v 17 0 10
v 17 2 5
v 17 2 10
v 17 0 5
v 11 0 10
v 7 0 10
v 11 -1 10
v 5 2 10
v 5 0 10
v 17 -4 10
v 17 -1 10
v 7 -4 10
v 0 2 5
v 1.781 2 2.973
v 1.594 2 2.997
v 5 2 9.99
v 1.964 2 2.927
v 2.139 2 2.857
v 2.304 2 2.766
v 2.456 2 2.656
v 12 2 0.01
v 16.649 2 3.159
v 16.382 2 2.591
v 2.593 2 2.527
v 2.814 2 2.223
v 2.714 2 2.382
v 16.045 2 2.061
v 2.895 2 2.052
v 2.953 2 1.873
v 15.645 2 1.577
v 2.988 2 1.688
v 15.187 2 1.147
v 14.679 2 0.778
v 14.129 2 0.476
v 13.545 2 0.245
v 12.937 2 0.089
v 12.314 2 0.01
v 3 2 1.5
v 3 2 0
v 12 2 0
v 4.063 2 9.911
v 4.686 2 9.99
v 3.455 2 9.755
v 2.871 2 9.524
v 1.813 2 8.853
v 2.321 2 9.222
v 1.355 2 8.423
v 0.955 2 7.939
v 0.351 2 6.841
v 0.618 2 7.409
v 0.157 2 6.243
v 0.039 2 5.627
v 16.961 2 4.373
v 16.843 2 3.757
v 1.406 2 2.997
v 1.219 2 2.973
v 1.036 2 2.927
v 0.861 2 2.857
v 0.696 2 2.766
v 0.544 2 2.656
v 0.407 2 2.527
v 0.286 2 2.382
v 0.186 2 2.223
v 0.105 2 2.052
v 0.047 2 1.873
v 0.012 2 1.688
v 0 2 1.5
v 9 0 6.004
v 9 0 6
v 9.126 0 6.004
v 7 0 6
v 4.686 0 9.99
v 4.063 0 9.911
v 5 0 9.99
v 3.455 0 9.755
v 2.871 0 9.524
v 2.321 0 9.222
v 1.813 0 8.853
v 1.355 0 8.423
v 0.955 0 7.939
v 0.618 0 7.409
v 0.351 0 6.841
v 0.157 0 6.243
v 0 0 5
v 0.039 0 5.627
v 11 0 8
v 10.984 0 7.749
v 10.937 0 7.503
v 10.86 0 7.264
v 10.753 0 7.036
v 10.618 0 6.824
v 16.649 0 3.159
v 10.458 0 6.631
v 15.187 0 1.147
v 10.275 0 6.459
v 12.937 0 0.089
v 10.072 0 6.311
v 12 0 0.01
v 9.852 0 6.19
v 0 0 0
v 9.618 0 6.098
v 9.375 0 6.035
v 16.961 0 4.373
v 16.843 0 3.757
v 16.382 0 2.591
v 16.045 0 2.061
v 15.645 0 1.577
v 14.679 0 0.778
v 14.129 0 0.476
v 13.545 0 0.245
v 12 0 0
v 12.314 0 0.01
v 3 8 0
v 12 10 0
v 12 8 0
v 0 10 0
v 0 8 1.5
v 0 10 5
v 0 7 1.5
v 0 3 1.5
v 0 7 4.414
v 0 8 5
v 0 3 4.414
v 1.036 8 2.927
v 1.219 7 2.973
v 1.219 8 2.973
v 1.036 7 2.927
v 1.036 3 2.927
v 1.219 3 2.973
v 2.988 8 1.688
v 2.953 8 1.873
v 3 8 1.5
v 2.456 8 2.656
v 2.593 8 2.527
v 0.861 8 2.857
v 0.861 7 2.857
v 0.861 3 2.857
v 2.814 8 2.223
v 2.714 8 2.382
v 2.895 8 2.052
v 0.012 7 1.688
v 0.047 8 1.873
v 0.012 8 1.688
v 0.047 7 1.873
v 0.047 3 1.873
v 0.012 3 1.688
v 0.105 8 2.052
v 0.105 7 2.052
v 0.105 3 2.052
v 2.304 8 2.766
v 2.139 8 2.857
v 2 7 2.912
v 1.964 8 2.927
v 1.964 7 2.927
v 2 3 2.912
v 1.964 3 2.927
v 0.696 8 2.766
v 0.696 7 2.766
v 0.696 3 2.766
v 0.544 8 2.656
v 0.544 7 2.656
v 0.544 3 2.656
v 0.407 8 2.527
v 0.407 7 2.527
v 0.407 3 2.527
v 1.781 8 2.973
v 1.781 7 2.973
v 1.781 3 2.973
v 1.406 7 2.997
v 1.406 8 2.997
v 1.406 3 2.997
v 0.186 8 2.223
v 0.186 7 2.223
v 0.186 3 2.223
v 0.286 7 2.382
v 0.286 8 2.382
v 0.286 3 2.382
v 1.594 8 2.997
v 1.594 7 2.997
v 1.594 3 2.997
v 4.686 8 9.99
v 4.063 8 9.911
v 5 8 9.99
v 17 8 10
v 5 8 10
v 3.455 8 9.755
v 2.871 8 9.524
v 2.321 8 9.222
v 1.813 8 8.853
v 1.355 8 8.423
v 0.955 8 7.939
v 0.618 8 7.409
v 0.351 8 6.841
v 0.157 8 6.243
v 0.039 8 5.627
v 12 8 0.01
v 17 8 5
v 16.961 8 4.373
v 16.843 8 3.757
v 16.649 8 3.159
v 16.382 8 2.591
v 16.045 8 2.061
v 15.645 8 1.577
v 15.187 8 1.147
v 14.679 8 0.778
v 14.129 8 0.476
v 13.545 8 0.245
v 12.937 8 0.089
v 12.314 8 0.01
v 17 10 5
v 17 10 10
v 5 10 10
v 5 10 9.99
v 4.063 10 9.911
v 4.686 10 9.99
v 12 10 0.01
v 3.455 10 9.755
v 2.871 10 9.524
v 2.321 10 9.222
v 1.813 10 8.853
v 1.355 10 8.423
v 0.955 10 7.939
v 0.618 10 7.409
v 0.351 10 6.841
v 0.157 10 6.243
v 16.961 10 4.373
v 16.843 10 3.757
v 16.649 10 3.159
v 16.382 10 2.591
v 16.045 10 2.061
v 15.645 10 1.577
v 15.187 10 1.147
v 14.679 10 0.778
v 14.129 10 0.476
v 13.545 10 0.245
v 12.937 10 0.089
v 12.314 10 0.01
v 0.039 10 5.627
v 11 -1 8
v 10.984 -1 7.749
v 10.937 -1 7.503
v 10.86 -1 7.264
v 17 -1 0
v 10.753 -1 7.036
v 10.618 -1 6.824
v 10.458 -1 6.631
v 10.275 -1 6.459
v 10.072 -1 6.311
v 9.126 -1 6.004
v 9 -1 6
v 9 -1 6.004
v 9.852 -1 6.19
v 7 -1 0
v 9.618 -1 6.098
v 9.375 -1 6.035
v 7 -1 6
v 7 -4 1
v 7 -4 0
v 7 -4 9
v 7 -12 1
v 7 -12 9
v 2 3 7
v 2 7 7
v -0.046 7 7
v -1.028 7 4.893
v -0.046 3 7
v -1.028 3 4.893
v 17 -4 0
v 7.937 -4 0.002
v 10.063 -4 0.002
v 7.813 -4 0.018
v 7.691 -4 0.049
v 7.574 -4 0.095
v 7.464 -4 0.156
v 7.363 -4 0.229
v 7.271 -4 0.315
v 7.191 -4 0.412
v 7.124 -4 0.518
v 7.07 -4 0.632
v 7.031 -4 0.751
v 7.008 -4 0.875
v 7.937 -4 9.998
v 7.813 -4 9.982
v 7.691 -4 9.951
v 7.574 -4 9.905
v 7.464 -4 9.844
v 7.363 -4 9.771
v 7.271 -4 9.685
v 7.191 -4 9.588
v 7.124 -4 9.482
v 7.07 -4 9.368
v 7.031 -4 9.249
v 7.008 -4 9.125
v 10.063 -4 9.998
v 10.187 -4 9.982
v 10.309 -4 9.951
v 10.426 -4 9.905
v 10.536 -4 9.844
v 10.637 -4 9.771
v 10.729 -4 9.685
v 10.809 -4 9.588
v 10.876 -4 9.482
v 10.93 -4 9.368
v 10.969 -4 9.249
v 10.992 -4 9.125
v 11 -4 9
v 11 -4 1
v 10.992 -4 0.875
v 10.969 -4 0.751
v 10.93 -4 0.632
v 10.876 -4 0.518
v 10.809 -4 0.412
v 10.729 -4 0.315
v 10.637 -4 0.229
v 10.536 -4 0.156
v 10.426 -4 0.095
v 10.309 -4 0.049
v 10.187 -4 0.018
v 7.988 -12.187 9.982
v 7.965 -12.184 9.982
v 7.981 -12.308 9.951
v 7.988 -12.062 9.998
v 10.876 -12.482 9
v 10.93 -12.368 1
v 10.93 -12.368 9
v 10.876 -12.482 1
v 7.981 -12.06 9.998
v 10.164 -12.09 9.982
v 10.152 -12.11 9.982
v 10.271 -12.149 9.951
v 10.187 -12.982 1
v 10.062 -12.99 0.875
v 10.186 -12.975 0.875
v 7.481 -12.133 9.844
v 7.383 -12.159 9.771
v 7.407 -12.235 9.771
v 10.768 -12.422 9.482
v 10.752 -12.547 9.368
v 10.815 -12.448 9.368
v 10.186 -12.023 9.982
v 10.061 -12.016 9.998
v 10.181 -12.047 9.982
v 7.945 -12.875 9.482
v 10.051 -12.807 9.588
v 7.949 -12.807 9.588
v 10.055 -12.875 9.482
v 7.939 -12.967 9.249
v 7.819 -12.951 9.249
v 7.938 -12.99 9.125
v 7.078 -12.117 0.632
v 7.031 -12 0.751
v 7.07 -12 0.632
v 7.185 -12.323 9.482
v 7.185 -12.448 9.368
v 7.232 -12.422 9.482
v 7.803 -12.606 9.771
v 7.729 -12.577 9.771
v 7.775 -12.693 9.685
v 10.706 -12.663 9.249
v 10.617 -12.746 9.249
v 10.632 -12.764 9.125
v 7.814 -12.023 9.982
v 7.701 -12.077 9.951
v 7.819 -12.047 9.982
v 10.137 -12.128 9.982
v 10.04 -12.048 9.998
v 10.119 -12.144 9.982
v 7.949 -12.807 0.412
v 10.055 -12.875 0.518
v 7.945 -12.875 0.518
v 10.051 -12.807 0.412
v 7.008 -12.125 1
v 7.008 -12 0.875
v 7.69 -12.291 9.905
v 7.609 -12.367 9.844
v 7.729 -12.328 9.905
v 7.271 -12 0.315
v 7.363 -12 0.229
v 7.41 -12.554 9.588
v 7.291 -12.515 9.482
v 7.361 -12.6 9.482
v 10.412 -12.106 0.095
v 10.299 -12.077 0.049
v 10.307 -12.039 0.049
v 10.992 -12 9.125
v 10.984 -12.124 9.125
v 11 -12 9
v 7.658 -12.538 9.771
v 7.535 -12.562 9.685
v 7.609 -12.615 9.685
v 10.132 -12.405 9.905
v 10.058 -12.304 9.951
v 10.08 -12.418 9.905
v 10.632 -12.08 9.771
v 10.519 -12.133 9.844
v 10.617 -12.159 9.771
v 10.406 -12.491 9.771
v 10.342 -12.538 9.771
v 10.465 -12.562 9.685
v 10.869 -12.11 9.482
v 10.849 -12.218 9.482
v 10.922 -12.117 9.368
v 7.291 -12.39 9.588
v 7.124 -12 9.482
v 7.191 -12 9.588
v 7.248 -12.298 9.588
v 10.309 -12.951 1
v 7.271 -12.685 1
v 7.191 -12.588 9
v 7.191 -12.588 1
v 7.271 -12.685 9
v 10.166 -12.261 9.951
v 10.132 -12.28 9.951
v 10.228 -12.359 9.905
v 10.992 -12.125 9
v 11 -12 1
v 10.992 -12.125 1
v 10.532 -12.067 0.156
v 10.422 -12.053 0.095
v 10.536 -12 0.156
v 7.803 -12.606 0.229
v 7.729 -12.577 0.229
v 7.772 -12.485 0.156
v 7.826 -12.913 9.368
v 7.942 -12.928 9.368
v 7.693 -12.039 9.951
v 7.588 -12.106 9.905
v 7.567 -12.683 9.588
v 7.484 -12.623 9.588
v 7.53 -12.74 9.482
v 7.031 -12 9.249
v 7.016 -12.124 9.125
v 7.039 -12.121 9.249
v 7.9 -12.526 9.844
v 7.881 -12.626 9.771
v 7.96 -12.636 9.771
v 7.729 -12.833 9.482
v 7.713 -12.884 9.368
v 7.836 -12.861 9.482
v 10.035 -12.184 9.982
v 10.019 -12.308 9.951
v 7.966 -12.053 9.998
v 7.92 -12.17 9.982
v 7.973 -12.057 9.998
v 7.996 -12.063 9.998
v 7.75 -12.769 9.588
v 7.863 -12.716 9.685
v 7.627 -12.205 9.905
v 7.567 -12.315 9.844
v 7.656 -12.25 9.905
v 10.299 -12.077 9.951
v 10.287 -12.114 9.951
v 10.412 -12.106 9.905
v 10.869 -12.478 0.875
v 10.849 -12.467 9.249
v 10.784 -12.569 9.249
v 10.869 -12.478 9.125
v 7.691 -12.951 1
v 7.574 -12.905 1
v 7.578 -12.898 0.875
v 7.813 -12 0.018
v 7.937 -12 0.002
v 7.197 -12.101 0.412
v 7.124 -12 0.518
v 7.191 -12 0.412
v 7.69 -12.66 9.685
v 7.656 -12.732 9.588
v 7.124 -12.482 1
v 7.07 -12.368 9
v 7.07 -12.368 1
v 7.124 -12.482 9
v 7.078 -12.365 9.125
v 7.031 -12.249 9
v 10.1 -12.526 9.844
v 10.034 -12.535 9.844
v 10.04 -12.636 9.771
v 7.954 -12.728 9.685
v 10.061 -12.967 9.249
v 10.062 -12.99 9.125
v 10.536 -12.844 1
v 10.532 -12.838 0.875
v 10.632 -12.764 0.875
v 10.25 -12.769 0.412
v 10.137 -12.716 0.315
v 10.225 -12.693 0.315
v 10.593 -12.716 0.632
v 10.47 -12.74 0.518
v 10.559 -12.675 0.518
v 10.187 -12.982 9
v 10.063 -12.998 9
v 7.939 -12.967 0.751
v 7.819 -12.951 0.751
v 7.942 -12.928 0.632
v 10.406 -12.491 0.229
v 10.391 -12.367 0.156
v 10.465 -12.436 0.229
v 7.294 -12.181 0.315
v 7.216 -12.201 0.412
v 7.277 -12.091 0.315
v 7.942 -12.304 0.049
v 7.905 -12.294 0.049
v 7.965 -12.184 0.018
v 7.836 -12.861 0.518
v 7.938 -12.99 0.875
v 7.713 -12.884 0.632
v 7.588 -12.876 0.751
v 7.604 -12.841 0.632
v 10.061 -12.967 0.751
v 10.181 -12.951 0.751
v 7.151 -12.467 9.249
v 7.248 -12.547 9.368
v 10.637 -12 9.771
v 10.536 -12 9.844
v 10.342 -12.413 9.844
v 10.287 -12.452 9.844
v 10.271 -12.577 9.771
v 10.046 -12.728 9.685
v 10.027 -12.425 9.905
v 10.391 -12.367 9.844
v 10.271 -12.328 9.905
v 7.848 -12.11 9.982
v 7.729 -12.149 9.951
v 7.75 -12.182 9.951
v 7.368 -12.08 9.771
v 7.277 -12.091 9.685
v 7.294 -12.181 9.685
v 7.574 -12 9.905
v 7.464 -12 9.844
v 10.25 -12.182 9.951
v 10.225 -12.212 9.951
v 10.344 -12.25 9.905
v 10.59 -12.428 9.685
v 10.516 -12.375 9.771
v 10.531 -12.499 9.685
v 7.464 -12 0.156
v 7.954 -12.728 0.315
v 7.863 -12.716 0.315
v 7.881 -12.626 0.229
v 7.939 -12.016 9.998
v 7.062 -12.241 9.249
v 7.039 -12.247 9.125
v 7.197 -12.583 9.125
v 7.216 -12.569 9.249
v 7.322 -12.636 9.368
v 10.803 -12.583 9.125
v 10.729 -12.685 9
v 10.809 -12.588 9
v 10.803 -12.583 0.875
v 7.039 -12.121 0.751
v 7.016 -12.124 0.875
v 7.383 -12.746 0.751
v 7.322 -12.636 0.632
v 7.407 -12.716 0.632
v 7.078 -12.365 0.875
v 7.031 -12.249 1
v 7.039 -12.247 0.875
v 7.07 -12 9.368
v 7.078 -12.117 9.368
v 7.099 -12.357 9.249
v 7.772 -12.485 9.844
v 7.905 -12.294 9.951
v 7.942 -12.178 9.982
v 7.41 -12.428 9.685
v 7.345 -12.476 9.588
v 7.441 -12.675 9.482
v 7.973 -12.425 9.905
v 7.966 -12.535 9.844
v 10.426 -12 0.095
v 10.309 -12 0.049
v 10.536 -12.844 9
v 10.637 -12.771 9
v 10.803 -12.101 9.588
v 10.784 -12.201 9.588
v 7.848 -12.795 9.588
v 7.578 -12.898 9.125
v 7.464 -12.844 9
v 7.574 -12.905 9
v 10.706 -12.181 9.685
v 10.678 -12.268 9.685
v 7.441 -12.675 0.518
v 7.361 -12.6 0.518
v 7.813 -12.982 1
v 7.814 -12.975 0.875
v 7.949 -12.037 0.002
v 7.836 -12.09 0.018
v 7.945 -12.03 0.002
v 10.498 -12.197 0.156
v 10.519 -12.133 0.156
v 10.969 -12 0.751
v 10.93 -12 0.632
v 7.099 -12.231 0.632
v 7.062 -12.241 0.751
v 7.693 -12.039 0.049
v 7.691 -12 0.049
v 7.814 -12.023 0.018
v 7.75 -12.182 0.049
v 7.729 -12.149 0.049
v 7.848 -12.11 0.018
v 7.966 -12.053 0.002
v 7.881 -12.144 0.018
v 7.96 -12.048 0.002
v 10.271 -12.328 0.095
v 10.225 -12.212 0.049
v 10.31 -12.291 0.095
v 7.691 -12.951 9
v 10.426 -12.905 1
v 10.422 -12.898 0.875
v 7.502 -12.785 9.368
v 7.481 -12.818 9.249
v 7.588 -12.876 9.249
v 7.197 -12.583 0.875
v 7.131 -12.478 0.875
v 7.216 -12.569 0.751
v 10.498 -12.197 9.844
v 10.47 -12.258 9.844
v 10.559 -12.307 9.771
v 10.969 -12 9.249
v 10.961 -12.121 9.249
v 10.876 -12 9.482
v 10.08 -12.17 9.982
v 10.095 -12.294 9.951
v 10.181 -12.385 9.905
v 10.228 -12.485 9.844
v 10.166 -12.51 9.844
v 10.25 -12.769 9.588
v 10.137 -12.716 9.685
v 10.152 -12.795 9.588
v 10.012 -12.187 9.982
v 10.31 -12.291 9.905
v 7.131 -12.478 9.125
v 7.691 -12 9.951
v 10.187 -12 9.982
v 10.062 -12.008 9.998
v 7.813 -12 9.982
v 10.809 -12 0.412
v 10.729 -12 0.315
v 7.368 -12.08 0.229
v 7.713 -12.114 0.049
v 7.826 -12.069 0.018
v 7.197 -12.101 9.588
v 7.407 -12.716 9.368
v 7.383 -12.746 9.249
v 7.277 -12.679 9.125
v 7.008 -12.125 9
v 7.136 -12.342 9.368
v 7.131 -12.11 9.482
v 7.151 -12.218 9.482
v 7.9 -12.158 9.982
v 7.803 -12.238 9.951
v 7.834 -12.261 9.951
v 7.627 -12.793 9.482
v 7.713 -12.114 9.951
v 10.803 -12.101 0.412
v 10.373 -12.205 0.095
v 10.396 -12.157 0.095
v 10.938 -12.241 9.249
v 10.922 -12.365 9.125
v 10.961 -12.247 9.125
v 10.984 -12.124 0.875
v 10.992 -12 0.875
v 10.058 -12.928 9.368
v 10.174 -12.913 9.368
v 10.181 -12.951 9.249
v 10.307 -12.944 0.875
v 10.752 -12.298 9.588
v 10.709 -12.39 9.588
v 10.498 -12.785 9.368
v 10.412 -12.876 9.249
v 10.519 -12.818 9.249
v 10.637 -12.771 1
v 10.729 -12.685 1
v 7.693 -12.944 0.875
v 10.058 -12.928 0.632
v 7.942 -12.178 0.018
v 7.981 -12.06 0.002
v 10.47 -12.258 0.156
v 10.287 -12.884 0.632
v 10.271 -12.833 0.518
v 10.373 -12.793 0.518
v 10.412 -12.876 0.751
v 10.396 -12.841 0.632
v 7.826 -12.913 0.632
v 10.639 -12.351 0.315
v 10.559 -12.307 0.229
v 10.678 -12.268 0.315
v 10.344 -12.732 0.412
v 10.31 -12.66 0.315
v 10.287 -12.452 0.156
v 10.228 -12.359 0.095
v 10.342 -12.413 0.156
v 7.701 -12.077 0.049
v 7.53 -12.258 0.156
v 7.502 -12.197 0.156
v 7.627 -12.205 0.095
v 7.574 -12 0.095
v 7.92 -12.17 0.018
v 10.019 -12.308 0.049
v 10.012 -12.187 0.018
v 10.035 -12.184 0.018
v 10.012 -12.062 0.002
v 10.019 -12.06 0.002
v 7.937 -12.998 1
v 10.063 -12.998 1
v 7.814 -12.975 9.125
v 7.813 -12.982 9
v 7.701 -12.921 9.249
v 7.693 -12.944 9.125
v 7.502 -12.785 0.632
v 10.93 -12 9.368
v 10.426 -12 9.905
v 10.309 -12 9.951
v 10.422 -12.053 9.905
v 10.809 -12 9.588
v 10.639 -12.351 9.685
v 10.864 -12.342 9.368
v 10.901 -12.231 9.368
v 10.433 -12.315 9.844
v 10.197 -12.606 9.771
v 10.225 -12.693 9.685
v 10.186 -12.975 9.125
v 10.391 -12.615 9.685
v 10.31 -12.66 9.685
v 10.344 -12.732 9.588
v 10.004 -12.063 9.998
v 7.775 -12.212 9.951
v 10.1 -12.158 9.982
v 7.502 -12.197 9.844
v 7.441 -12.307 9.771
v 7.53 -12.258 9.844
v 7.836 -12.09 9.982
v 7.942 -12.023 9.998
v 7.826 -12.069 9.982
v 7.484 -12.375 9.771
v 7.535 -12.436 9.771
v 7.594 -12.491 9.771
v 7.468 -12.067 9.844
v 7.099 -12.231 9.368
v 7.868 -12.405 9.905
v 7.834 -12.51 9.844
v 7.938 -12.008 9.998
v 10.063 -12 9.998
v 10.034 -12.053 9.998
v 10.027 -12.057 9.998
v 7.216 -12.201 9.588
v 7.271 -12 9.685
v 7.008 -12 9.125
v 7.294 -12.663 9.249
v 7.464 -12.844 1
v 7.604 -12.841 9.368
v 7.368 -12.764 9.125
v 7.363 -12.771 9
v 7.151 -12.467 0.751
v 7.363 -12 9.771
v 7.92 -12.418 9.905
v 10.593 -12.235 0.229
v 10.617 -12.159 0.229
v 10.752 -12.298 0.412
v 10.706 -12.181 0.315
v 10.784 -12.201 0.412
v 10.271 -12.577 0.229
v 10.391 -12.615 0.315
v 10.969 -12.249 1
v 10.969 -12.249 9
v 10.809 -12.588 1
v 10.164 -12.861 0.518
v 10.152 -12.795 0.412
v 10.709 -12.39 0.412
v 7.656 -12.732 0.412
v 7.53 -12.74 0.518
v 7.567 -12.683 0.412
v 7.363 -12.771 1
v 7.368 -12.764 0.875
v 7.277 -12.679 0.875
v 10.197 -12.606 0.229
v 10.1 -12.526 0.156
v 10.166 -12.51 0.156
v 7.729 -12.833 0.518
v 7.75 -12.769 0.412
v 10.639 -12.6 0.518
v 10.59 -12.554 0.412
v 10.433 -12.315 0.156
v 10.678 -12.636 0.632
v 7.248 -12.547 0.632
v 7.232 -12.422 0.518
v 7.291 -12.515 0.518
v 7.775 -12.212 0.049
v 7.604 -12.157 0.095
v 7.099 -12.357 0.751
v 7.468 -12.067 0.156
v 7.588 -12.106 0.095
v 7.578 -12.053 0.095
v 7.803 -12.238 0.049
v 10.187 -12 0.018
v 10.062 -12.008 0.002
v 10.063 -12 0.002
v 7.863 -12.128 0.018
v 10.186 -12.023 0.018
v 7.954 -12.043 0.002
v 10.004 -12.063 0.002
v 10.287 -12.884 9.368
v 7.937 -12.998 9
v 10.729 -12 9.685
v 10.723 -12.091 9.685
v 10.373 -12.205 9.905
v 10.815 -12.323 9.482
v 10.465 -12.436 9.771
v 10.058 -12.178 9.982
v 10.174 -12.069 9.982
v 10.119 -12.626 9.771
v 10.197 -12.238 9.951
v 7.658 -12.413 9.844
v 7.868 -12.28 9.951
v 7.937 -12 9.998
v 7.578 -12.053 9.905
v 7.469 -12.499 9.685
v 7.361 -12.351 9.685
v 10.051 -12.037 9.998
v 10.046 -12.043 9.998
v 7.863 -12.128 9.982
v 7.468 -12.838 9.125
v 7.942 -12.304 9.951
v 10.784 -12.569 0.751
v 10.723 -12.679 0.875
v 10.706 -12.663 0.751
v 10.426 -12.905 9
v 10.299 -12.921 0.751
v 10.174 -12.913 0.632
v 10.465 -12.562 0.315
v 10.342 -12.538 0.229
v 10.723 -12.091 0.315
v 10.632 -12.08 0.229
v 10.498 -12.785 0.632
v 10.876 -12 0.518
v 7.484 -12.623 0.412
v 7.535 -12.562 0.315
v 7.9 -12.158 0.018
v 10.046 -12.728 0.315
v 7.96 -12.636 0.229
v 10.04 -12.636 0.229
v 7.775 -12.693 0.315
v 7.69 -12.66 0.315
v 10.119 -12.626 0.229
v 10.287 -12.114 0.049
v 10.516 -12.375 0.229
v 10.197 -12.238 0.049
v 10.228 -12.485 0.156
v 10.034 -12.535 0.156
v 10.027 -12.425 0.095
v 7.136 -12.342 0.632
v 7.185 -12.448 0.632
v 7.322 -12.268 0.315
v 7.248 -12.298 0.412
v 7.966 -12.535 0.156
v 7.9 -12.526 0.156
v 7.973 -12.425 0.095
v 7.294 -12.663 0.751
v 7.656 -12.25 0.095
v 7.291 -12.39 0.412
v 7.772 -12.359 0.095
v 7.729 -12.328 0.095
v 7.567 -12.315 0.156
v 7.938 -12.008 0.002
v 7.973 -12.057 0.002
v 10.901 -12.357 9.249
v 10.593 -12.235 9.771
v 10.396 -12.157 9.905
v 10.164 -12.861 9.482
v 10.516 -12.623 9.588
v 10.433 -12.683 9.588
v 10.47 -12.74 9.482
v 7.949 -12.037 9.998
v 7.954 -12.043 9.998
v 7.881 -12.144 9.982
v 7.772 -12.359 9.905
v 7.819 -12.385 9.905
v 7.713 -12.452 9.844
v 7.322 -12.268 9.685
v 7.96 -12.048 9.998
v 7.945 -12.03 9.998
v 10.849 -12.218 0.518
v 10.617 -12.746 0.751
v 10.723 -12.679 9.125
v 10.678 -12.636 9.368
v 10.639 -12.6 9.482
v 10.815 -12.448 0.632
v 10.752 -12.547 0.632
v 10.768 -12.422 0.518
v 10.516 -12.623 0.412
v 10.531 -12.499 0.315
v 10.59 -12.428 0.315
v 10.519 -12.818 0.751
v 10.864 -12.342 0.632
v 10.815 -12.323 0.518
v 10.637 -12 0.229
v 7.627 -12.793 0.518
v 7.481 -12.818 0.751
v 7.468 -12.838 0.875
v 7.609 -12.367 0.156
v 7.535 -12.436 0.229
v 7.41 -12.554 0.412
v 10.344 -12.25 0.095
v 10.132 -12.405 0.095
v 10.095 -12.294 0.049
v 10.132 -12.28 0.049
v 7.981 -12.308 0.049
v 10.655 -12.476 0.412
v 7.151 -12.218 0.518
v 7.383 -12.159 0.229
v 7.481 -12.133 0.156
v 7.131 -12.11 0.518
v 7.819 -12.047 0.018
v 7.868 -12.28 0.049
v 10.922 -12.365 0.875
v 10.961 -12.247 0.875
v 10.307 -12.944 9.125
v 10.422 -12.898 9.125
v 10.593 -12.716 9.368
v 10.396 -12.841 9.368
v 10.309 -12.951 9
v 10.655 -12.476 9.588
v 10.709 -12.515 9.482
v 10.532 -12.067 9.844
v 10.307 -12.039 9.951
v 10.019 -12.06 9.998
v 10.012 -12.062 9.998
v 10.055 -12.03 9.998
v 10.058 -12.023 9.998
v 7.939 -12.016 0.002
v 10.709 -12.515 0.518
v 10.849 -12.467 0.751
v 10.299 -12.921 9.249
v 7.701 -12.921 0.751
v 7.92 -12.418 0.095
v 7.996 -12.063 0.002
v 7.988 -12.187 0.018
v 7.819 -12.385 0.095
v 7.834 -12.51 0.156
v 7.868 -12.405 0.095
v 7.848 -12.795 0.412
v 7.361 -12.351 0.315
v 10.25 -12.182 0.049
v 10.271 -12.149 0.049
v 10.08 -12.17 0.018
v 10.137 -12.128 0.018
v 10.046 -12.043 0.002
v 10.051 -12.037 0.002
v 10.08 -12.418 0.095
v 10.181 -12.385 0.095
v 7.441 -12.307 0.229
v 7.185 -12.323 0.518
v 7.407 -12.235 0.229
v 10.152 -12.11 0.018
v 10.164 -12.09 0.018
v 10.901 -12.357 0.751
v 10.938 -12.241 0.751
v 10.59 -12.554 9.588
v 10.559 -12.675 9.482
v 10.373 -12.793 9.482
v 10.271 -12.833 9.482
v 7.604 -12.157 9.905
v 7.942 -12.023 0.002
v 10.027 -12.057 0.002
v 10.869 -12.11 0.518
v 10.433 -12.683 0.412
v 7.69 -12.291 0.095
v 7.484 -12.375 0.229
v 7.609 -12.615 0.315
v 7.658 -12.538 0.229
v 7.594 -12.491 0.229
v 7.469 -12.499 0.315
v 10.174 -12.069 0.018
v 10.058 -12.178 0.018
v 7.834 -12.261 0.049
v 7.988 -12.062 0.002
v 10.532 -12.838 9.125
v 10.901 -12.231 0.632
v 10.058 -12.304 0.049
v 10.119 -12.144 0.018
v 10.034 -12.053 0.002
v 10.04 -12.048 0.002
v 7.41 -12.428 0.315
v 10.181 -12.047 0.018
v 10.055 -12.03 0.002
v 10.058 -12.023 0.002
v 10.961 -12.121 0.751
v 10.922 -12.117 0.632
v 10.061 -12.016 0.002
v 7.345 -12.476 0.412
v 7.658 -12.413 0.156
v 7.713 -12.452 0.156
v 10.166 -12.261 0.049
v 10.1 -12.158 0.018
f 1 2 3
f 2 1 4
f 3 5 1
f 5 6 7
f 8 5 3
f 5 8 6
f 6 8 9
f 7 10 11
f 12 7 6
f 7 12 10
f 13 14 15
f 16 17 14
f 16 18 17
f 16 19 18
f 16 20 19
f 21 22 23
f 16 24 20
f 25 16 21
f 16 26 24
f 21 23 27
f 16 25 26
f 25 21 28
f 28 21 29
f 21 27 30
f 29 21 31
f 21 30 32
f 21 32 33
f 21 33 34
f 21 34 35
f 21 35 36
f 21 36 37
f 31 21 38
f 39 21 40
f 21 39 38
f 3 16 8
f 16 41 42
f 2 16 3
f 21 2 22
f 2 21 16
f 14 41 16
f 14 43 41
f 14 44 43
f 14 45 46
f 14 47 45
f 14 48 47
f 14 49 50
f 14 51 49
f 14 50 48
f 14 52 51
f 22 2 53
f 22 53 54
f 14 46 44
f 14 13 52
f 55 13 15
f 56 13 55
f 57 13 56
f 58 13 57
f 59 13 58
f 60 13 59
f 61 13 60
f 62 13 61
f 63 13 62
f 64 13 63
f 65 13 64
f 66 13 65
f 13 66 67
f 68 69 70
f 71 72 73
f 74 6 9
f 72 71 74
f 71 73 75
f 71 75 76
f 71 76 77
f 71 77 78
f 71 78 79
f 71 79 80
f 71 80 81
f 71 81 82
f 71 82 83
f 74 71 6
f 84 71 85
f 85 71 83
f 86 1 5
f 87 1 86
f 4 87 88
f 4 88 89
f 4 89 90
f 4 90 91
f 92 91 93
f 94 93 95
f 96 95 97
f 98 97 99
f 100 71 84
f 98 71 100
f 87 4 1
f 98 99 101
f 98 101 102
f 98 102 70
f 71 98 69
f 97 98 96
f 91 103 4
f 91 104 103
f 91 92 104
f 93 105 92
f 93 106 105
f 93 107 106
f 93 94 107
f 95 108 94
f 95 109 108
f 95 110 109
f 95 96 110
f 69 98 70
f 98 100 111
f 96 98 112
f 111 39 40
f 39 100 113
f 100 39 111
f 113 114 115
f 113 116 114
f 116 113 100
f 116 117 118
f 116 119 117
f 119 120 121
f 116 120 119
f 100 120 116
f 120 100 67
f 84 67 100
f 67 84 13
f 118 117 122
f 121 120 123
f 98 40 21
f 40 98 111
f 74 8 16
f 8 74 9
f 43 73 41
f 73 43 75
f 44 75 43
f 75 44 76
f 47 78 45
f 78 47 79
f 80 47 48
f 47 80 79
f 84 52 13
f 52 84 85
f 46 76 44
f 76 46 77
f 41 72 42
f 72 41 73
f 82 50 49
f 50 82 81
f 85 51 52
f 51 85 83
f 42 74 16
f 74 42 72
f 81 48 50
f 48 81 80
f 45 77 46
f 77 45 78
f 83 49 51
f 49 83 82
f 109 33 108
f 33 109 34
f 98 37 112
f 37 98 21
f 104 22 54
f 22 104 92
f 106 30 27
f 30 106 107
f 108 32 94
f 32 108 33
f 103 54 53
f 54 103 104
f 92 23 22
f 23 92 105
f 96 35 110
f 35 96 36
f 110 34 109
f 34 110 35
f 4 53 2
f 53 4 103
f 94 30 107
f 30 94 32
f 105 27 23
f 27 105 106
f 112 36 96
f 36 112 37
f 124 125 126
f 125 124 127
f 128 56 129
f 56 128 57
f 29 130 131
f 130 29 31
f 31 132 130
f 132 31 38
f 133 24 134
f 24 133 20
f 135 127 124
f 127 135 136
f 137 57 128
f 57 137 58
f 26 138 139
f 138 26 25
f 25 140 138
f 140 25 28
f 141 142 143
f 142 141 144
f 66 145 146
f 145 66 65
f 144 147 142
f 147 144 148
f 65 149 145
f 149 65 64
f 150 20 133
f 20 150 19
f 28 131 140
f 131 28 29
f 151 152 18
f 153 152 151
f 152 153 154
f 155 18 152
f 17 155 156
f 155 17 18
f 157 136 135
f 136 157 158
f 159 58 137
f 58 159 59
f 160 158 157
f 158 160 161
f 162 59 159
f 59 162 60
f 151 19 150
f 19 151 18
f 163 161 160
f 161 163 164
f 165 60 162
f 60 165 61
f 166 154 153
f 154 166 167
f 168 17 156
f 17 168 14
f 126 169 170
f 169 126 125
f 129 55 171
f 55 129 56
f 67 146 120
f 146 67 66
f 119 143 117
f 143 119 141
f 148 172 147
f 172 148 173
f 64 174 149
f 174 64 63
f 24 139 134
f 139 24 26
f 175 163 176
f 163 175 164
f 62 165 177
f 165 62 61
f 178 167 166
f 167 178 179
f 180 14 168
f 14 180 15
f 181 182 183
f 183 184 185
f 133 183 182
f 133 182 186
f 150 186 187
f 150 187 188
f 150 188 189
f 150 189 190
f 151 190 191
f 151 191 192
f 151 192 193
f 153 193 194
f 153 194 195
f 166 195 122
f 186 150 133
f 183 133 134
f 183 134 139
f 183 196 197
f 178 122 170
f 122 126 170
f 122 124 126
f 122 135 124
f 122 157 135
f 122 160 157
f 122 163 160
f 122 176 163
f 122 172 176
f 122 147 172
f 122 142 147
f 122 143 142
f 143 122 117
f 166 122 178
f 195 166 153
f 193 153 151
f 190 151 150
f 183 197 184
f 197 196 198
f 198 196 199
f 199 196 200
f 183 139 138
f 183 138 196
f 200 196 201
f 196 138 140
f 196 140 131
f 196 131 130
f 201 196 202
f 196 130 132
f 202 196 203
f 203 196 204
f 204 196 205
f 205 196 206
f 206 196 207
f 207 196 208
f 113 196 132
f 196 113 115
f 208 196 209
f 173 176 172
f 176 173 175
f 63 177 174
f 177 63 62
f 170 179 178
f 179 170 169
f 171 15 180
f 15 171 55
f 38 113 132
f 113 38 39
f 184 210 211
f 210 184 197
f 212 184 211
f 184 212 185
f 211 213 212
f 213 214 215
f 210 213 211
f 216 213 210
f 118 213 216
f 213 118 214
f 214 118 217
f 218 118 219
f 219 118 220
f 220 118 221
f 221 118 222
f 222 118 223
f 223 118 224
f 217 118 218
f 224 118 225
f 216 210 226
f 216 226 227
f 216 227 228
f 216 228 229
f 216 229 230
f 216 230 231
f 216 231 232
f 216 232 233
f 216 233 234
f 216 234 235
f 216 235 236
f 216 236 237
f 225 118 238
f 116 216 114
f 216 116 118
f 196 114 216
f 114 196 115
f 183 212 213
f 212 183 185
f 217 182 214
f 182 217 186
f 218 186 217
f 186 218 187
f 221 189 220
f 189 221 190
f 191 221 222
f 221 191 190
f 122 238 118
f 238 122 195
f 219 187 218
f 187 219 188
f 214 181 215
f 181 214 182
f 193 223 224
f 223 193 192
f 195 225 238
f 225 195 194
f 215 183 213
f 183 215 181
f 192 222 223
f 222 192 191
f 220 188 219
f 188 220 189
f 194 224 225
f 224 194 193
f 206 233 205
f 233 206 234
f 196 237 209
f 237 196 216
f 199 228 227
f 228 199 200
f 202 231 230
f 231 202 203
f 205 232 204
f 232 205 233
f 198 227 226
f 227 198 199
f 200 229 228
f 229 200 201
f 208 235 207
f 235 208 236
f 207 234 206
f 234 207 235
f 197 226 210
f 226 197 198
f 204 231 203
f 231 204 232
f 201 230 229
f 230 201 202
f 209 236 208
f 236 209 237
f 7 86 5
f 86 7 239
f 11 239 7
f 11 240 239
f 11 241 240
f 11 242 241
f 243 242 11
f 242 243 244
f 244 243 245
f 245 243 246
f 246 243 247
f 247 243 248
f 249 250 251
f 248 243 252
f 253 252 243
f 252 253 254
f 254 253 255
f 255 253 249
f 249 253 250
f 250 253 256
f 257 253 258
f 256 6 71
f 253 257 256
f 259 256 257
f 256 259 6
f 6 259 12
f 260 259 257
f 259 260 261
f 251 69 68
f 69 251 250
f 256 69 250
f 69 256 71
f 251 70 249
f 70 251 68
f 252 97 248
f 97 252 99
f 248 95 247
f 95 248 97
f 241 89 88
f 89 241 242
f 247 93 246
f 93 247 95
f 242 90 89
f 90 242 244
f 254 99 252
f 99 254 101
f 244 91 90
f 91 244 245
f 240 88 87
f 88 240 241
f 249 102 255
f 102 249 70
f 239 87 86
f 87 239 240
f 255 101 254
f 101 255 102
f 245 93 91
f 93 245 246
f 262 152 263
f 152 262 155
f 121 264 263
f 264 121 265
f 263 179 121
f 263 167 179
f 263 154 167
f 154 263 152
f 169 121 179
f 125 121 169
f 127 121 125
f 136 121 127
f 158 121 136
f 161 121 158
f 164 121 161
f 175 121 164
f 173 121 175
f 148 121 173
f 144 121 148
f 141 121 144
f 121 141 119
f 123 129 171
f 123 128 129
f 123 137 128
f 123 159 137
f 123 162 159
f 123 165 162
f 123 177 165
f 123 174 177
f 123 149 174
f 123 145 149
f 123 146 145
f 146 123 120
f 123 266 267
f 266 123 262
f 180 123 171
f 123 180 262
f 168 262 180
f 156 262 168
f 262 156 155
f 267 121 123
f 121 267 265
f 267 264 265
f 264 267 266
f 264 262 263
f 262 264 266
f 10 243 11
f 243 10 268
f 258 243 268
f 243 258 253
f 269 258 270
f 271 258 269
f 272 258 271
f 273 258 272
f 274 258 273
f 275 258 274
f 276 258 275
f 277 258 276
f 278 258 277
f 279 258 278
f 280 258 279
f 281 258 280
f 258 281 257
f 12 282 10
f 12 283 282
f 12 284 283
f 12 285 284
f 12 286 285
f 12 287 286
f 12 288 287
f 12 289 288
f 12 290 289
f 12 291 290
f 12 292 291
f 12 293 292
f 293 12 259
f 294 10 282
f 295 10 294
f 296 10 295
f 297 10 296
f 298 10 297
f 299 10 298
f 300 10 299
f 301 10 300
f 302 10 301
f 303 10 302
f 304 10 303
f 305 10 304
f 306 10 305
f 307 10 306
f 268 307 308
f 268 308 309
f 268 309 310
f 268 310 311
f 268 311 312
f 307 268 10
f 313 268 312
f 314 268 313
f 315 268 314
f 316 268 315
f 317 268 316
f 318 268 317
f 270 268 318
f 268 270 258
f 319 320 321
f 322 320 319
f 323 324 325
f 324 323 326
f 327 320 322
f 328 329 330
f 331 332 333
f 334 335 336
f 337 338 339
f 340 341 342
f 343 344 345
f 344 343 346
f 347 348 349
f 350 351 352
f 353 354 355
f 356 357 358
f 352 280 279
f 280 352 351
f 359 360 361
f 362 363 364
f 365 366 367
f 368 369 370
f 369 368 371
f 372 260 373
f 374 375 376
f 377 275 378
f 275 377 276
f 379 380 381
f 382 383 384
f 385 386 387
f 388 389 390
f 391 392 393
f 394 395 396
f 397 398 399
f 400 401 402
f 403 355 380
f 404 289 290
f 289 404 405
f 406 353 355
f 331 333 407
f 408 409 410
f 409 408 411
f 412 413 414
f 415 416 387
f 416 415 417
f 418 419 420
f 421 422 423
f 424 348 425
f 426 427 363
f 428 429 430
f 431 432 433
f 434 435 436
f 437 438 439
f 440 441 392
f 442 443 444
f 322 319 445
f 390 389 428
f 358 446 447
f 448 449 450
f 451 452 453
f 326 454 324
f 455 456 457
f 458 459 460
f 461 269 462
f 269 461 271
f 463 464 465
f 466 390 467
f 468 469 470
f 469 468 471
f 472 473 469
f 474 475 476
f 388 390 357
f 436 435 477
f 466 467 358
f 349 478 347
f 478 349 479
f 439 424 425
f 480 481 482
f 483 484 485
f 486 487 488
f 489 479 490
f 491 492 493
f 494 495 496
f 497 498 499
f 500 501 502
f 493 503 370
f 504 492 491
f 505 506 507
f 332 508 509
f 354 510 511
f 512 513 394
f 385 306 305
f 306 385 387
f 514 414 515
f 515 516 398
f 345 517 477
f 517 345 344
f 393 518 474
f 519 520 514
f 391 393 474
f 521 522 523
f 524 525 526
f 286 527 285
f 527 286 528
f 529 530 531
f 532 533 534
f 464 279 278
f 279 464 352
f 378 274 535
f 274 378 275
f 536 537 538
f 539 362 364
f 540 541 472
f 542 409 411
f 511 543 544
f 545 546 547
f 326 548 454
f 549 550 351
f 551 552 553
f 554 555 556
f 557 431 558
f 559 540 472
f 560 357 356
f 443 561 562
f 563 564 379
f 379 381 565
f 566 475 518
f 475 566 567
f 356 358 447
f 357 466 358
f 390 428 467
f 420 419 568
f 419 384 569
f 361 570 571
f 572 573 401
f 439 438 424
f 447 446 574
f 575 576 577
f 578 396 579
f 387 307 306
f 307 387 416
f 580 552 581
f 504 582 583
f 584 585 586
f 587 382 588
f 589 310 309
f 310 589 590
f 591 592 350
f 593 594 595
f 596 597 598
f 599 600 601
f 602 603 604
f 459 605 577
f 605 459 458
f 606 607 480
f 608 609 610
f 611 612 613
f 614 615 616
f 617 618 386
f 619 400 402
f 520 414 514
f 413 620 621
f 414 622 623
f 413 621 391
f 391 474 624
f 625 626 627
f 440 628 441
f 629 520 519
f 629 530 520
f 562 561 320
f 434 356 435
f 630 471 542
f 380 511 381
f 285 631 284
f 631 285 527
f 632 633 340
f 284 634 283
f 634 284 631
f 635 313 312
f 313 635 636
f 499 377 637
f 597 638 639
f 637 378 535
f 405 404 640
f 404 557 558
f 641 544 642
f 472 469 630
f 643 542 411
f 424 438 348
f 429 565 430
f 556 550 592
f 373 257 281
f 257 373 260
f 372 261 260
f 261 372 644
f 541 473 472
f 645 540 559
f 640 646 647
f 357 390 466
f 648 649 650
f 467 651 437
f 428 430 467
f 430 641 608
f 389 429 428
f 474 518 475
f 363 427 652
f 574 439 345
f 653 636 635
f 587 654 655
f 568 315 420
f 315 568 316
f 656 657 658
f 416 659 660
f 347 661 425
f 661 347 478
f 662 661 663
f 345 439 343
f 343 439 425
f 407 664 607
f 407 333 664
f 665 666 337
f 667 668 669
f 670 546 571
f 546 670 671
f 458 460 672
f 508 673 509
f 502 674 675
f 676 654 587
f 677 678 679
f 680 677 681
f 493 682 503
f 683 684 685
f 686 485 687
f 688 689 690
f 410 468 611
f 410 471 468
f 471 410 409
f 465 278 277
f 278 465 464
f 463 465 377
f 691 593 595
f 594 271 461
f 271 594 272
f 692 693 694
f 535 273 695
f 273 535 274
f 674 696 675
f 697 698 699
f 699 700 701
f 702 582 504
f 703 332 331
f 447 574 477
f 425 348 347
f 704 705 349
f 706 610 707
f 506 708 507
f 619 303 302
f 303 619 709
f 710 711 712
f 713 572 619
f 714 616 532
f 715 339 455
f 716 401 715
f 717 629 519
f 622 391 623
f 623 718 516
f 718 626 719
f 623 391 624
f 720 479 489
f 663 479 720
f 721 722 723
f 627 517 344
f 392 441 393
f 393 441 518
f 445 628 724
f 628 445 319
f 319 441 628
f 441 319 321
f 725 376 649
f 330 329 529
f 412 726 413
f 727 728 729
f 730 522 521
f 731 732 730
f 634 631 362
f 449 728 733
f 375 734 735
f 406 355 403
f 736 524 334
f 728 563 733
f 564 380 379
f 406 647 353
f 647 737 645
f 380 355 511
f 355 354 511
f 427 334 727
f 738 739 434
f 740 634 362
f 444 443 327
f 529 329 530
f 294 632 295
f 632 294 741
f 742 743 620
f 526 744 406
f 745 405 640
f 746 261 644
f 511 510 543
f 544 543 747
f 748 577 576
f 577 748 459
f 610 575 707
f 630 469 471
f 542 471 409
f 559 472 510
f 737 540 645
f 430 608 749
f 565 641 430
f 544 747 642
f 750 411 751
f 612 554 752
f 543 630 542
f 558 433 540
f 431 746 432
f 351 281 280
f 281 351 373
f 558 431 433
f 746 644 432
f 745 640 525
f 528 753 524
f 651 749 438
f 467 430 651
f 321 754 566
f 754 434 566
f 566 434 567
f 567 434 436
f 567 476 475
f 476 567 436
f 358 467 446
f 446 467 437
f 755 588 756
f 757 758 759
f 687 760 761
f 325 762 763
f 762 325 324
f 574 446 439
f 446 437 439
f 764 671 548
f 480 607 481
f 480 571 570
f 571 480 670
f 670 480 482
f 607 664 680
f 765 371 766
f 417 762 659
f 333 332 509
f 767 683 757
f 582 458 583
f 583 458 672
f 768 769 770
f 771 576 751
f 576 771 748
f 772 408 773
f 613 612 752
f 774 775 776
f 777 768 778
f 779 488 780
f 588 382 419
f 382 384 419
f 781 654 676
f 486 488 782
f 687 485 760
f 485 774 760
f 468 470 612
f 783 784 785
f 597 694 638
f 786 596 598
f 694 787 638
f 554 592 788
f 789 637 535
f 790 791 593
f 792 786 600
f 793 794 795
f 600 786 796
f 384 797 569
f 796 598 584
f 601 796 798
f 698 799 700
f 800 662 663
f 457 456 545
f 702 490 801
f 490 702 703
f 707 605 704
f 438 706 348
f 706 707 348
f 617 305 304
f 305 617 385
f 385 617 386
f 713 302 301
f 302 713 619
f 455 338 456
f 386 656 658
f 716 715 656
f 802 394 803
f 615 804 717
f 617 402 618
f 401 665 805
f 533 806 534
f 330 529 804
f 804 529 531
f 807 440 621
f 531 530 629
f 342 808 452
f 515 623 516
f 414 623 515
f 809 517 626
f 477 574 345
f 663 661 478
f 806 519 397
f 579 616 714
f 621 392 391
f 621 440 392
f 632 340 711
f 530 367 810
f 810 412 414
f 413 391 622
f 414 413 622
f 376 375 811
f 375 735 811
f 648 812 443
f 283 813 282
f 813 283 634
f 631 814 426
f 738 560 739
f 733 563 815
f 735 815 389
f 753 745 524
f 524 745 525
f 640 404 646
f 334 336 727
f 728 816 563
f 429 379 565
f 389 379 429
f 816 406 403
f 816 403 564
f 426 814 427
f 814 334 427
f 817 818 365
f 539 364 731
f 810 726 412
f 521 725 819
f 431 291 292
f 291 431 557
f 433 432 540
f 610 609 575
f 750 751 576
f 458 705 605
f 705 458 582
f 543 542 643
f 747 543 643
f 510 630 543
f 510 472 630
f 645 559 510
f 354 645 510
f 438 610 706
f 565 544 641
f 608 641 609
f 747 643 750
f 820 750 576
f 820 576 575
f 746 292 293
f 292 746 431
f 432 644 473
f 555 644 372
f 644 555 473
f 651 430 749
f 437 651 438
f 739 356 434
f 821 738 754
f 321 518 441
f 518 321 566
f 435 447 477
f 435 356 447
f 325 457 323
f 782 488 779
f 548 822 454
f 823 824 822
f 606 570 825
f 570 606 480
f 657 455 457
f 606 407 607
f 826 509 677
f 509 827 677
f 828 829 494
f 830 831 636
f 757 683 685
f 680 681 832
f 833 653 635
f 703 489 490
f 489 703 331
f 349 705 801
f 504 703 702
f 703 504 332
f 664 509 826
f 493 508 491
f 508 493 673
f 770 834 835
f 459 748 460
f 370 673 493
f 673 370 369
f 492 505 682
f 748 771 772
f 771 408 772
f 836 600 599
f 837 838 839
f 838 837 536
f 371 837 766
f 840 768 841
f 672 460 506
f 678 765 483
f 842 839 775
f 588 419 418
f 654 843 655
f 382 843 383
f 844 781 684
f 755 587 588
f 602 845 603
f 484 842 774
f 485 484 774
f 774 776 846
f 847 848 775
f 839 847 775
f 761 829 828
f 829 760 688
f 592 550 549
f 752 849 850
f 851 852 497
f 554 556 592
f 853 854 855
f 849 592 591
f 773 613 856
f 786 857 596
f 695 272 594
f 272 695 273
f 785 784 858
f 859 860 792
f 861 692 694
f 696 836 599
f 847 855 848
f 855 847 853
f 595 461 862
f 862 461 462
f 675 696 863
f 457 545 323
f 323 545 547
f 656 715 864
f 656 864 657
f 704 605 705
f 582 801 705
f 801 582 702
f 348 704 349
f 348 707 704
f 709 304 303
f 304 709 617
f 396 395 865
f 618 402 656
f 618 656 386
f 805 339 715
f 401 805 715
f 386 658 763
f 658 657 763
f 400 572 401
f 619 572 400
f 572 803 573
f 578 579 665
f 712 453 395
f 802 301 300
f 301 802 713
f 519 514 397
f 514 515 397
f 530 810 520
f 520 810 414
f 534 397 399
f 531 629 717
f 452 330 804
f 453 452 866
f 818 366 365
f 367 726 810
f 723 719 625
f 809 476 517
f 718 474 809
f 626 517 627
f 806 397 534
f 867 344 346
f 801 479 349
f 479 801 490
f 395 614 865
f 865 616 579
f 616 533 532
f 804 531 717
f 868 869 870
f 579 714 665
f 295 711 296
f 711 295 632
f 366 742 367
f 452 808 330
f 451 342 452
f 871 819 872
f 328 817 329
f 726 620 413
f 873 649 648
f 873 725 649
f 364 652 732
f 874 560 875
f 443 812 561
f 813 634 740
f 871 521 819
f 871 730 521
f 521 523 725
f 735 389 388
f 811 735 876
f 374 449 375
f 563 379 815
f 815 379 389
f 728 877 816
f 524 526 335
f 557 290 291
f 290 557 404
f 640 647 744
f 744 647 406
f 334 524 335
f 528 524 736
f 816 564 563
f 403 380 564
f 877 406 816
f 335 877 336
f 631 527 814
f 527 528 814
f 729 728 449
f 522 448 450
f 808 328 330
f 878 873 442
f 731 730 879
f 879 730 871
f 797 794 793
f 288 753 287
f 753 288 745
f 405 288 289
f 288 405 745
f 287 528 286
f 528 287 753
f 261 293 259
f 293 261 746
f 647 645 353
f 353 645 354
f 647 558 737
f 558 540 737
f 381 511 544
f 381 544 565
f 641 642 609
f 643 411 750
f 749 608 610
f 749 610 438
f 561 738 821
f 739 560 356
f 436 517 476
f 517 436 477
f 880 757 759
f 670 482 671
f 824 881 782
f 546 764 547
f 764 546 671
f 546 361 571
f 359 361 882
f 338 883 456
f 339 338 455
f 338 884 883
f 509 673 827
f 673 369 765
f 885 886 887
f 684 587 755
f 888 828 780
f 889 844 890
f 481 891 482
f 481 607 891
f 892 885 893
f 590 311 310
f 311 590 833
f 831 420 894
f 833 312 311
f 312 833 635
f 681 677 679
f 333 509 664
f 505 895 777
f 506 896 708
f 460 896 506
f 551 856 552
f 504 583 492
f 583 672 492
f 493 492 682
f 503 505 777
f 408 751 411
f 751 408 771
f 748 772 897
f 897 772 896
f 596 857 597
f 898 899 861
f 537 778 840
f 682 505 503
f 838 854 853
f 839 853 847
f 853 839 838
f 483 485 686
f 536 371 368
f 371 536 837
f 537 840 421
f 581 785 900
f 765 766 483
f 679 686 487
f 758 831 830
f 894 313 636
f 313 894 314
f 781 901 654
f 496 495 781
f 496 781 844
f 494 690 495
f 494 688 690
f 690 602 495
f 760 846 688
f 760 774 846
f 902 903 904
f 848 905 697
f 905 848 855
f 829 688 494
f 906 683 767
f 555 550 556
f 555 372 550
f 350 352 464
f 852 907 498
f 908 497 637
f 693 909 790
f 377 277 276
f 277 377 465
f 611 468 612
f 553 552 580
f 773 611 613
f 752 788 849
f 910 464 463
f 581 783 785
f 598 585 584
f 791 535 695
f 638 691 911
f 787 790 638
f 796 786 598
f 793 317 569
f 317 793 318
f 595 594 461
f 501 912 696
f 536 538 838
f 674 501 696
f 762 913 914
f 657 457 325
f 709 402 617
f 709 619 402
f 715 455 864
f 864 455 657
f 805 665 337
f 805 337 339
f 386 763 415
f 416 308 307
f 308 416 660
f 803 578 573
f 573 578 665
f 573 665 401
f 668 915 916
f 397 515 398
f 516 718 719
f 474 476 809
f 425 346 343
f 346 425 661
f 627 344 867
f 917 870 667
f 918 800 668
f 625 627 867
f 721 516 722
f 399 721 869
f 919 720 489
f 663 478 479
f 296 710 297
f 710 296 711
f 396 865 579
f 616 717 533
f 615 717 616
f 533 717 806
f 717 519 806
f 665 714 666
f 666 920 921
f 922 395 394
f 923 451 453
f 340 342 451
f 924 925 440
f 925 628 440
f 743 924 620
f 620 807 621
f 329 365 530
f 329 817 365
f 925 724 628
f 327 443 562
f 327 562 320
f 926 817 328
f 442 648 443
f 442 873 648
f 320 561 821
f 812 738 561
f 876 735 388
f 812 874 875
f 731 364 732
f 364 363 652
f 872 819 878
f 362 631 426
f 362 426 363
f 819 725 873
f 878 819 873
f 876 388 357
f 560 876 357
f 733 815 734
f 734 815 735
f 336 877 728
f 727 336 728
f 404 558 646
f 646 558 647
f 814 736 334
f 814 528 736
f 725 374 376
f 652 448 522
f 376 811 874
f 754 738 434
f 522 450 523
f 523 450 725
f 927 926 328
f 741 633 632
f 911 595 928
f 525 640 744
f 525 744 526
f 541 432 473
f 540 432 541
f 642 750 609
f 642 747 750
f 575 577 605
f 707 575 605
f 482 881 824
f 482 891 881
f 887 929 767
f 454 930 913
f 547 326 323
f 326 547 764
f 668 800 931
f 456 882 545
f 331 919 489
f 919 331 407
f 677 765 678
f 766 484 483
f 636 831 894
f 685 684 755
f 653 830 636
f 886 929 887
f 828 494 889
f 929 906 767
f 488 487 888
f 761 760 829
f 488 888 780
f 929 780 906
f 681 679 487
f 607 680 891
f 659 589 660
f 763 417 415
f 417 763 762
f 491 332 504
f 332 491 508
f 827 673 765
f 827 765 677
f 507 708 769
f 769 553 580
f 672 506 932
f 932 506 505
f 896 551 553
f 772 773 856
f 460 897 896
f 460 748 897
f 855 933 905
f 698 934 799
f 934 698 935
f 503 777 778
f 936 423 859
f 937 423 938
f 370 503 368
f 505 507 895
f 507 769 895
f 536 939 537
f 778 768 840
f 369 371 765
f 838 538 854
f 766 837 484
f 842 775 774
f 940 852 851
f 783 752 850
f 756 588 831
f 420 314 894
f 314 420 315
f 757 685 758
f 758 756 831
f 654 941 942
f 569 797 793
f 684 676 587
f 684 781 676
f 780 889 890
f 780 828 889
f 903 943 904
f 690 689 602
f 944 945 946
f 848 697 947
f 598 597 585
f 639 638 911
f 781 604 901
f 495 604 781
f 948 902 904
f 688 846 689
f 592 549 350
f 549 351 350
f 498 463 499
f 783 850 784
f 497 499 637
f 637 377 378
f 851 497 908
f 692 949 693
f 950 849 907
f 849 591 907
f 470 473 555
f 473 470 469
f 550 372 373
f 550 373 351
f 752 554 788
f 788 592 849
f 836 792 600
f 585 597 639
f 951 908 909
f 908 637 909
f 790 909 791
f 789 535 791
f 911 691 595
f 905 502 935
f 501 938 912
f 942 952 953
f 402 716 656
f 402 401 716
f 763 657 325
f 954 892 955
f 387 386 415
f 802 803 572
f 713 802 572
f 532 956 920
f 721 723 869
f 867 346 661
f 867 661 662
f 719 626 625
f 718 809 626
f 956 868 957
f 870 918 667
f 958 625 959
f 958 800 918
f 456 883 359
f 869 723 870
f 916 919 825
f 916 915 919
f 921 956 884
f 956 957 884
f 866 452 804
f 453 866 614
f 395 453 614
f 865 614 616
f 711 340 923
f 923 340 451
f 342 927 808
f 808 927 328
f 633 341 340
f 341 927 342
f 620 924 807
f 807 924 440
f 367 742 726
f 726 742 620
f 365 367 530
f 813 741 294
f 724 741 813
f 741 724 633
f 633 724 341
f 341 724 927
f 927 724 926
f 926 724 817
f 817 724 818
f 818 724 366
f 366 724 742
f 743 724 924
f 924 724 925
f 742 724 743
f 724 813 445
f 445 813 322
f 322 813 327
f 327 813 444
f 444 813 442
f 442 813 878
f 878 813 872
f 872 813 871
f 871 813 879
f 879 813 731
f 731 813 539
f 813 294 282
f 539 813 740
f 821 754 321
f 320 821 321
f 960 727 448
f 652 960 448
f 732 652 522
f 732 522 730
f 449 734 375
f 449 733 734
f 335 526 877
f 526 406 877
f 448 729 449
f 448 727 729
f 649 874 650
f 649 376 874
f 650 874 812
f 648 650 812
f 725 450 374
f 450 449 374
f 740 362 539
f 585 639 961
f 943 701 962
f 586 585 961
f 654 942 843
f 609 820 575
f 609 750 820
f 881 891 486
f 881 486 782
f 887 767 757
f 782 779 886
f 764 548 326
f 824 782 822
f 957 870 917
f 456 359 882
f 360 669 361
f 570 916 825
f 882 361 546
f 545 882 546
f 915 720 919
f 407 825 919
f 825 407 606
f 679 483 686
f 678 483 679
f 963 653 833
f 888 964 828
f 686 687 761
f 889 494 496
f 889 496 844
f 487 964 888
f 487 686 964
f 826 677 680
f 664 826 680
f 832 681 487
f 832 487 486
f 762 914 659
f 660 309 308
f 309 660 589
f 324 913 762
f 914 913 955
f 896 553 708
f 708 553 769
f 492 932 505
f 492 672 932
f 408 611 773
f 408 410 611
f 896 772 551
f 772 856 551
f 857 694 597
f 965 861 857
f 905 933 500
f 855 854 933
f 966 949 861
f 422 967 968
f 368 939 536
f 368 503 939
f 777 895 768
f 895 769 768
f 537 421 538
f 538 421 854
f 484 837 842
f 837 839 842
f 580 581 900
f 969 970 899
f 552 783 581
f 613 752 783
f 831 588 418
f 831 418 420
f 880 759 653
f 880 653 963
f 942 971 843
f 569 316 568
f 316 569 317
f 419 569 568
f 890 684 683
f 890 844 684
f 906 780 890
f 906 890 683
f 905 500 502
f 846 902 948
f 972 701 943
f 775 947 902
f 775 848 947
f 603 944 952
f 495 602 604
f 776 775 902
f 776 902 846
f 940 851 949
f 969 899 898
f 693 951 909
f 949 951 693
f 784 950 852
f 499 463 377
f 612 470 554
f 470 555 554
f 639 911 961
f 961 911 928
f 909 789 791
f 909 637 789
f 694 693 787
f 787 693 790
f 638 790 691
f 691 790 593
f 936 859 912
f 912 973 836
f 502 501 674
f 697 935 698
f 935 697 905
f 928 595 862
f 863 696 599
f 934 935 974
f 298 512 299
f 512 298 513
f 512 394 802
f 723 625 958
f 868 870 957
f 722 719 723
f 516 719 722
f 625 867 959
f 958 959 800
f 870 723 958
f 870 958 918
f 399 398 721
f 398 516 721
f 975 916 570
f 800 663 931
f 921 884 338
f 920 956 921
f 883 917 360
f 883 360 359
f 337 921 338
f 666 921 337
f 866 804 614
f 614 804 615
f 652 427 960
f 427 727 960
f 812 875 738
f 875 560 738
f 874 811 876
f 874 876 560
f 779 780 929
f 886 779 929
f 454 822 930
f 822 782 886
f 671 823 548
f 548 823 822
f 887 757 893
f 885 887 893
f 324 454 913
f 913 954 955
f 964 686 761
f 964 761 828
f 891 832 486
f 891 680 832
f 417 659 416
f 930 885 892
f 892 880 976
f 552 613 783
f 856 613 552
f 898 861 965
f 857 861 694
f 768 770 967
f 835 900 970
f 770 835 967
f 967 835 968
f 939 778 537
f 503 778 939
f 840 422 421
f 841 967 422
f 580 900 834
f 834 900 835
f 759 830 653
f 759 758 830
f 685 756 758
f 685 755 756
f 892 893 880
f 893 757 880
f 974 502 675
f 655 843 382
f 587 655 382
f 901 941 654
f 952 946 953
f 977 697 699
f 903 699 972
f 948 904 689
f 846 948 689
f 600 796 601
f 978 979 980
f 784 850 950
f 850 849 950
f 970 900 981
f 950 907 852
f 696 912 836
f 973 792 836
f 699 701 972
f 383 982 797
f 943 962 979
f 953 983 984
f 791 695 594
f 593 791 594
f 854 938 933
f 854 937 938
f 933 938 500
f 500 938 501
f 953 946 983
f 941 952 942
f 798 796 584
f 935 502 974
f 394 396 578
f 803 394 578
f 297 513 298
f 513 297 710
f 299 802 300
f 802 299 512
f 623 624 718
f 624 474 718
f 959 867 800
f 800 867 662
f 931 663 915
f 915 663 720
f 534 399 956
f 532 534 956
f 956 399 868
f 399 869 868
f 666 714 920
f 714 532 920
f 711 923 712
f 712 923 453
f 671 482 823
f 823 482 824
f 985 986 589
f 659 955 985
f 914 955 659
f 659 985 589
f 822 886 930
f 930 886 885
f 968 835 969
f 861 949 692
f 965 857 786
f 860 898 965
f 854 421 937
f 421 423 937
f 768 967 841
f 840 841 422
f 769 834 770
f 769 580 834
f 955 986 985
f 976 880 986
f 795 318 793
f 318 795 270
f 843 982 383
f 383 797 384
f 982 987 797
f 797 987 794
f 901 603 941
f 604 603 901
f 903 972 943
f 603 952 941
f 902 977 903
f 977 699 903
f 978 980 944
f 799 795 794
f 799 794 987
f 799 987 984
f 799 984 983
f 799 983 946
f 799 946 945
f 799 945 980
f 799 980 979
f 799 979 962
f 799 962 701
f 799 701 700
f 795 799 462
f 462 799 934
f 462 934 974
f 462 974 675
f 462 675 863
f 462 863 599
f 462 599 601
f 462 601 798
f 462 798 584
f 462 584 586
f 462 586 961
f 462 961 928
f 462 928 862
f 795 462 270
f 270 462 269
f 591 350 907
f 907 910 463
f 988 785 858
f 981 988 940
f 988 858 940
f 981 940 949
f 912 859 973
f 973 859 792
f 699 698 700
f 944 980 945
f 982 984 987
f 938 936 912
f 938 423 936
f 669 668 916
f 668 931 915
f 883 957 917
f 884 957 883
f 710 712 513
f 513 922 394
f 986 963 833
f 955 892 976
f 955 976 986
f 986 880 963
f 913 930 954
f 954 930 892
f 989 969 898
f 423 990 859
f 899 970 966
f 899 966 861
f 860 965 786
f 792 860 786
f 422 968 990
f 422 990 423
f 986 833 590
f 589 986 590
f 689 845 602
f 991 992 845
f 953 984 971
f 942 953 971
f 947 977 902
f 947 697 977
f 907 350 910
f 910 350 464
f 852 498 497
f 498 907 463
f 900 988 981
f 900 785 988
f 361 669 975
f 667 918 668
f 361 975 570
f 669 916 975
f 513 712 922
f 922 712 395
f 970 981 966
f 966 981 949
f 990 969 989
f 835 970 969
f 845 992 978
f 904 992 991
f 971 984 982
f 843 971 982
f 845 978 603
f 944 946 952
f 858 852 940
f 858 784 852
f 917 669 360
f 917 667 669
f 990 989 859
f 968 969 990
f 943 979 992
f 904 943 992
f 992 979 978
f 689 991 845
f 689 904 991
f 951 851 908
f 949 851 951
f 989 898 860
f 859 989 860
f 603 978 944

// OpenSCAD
$fn=50;

// front

union() {
     translate([10, 0, 5]) {
          cube([7, 2, 5]);
     }
     translate([0, 0, 0]) {
          cube([8, 2, 5]);
     }
     translate([5, 0, 0]) {
          cube([7, 2, 10]);
     }
     translate([5, 2, 5]) {
          rotate(a=90,  v=[1, 0, 0]) {
               cylinder(h=2, r=5);
          }
     }
     translate([12, 2, 5]) {
          rotate(a=90,  v=[1, 0, 0]) {
               cylinder(h=2, r=5);
          }
     }
}

// cable hook

union() {
     translate([1.5, 8, 1.5]) {
          rotate(a=90,  v=[1, 0, 0]) {
               cylinder(h=8, r=1.5);
          }
     }
     translate([0, 2, 0]) {
          cube([3, 7, 1.5]);
     }
}

// back

union() {
     translate([10, 8, 5]) {
          cube([7, 2, 5]);
     }
     translate([0, 8, 0]) {
          cube([8, 2, 5]);
     }
     translate([5, 8, 0]) {
          cube([7, 2, 10]);
     }
     translate([5, 10, 5]) {
          rotate(a=90,  v=[1, 0, 0]) {
               cylinder(h=2, r=5);
          }
     }
     translate([12, 10, 5]) {
          rotate(a=90,  v=[1, 0, 0]) {
               cylinder(h=2, r=5);
          }
     }
}

// shelf hook

translate([7, -4, 0]) {
     cube([10,3,10]);
}

union() {
     translate([9, -1, 8]) {
          cube([2, 1, 2]);
     }
     translate([7, -1, 8]) {
          cube([2, 1, 2]);
     }
     translate([7, -1, 6]) {
          cube([2, 1, 2]);
     }
     translate([9, -0, 8]) {
          rotate(a=90,  v=[1, 0, 0]) {
               cylinder(h=1, r=2);
          }
     }
}

// handle

translate([-4,  10,  -1]) {
     minkowski() {
          translate([6,  -11,  1]) {
               cube([2, 8, 8]);
          }
          translate([6,  -11,  1]) {
               sphere(1);
          }
     }
}

// lock

difference() {

     union() {
          difference() {
               translate([0, 3, 0]) {
                    cube([2, 4, 10]);
               }
               rotate(a=25,  v=[0, 1, 0]) {
                    translate([-5, 3, 6]) {
                         cube([2, 4, 4]);
                    }
               }
          }
          rotate(a=25,  v=[0, 1, 0]) {
               translate([-3, 3, 4]) {
                    cube([2, 4, 2.5]);
               }
          }
     }

     translate([-1, 2.5, 7]) {
          cube([5, 5, 5]);
     }

}
